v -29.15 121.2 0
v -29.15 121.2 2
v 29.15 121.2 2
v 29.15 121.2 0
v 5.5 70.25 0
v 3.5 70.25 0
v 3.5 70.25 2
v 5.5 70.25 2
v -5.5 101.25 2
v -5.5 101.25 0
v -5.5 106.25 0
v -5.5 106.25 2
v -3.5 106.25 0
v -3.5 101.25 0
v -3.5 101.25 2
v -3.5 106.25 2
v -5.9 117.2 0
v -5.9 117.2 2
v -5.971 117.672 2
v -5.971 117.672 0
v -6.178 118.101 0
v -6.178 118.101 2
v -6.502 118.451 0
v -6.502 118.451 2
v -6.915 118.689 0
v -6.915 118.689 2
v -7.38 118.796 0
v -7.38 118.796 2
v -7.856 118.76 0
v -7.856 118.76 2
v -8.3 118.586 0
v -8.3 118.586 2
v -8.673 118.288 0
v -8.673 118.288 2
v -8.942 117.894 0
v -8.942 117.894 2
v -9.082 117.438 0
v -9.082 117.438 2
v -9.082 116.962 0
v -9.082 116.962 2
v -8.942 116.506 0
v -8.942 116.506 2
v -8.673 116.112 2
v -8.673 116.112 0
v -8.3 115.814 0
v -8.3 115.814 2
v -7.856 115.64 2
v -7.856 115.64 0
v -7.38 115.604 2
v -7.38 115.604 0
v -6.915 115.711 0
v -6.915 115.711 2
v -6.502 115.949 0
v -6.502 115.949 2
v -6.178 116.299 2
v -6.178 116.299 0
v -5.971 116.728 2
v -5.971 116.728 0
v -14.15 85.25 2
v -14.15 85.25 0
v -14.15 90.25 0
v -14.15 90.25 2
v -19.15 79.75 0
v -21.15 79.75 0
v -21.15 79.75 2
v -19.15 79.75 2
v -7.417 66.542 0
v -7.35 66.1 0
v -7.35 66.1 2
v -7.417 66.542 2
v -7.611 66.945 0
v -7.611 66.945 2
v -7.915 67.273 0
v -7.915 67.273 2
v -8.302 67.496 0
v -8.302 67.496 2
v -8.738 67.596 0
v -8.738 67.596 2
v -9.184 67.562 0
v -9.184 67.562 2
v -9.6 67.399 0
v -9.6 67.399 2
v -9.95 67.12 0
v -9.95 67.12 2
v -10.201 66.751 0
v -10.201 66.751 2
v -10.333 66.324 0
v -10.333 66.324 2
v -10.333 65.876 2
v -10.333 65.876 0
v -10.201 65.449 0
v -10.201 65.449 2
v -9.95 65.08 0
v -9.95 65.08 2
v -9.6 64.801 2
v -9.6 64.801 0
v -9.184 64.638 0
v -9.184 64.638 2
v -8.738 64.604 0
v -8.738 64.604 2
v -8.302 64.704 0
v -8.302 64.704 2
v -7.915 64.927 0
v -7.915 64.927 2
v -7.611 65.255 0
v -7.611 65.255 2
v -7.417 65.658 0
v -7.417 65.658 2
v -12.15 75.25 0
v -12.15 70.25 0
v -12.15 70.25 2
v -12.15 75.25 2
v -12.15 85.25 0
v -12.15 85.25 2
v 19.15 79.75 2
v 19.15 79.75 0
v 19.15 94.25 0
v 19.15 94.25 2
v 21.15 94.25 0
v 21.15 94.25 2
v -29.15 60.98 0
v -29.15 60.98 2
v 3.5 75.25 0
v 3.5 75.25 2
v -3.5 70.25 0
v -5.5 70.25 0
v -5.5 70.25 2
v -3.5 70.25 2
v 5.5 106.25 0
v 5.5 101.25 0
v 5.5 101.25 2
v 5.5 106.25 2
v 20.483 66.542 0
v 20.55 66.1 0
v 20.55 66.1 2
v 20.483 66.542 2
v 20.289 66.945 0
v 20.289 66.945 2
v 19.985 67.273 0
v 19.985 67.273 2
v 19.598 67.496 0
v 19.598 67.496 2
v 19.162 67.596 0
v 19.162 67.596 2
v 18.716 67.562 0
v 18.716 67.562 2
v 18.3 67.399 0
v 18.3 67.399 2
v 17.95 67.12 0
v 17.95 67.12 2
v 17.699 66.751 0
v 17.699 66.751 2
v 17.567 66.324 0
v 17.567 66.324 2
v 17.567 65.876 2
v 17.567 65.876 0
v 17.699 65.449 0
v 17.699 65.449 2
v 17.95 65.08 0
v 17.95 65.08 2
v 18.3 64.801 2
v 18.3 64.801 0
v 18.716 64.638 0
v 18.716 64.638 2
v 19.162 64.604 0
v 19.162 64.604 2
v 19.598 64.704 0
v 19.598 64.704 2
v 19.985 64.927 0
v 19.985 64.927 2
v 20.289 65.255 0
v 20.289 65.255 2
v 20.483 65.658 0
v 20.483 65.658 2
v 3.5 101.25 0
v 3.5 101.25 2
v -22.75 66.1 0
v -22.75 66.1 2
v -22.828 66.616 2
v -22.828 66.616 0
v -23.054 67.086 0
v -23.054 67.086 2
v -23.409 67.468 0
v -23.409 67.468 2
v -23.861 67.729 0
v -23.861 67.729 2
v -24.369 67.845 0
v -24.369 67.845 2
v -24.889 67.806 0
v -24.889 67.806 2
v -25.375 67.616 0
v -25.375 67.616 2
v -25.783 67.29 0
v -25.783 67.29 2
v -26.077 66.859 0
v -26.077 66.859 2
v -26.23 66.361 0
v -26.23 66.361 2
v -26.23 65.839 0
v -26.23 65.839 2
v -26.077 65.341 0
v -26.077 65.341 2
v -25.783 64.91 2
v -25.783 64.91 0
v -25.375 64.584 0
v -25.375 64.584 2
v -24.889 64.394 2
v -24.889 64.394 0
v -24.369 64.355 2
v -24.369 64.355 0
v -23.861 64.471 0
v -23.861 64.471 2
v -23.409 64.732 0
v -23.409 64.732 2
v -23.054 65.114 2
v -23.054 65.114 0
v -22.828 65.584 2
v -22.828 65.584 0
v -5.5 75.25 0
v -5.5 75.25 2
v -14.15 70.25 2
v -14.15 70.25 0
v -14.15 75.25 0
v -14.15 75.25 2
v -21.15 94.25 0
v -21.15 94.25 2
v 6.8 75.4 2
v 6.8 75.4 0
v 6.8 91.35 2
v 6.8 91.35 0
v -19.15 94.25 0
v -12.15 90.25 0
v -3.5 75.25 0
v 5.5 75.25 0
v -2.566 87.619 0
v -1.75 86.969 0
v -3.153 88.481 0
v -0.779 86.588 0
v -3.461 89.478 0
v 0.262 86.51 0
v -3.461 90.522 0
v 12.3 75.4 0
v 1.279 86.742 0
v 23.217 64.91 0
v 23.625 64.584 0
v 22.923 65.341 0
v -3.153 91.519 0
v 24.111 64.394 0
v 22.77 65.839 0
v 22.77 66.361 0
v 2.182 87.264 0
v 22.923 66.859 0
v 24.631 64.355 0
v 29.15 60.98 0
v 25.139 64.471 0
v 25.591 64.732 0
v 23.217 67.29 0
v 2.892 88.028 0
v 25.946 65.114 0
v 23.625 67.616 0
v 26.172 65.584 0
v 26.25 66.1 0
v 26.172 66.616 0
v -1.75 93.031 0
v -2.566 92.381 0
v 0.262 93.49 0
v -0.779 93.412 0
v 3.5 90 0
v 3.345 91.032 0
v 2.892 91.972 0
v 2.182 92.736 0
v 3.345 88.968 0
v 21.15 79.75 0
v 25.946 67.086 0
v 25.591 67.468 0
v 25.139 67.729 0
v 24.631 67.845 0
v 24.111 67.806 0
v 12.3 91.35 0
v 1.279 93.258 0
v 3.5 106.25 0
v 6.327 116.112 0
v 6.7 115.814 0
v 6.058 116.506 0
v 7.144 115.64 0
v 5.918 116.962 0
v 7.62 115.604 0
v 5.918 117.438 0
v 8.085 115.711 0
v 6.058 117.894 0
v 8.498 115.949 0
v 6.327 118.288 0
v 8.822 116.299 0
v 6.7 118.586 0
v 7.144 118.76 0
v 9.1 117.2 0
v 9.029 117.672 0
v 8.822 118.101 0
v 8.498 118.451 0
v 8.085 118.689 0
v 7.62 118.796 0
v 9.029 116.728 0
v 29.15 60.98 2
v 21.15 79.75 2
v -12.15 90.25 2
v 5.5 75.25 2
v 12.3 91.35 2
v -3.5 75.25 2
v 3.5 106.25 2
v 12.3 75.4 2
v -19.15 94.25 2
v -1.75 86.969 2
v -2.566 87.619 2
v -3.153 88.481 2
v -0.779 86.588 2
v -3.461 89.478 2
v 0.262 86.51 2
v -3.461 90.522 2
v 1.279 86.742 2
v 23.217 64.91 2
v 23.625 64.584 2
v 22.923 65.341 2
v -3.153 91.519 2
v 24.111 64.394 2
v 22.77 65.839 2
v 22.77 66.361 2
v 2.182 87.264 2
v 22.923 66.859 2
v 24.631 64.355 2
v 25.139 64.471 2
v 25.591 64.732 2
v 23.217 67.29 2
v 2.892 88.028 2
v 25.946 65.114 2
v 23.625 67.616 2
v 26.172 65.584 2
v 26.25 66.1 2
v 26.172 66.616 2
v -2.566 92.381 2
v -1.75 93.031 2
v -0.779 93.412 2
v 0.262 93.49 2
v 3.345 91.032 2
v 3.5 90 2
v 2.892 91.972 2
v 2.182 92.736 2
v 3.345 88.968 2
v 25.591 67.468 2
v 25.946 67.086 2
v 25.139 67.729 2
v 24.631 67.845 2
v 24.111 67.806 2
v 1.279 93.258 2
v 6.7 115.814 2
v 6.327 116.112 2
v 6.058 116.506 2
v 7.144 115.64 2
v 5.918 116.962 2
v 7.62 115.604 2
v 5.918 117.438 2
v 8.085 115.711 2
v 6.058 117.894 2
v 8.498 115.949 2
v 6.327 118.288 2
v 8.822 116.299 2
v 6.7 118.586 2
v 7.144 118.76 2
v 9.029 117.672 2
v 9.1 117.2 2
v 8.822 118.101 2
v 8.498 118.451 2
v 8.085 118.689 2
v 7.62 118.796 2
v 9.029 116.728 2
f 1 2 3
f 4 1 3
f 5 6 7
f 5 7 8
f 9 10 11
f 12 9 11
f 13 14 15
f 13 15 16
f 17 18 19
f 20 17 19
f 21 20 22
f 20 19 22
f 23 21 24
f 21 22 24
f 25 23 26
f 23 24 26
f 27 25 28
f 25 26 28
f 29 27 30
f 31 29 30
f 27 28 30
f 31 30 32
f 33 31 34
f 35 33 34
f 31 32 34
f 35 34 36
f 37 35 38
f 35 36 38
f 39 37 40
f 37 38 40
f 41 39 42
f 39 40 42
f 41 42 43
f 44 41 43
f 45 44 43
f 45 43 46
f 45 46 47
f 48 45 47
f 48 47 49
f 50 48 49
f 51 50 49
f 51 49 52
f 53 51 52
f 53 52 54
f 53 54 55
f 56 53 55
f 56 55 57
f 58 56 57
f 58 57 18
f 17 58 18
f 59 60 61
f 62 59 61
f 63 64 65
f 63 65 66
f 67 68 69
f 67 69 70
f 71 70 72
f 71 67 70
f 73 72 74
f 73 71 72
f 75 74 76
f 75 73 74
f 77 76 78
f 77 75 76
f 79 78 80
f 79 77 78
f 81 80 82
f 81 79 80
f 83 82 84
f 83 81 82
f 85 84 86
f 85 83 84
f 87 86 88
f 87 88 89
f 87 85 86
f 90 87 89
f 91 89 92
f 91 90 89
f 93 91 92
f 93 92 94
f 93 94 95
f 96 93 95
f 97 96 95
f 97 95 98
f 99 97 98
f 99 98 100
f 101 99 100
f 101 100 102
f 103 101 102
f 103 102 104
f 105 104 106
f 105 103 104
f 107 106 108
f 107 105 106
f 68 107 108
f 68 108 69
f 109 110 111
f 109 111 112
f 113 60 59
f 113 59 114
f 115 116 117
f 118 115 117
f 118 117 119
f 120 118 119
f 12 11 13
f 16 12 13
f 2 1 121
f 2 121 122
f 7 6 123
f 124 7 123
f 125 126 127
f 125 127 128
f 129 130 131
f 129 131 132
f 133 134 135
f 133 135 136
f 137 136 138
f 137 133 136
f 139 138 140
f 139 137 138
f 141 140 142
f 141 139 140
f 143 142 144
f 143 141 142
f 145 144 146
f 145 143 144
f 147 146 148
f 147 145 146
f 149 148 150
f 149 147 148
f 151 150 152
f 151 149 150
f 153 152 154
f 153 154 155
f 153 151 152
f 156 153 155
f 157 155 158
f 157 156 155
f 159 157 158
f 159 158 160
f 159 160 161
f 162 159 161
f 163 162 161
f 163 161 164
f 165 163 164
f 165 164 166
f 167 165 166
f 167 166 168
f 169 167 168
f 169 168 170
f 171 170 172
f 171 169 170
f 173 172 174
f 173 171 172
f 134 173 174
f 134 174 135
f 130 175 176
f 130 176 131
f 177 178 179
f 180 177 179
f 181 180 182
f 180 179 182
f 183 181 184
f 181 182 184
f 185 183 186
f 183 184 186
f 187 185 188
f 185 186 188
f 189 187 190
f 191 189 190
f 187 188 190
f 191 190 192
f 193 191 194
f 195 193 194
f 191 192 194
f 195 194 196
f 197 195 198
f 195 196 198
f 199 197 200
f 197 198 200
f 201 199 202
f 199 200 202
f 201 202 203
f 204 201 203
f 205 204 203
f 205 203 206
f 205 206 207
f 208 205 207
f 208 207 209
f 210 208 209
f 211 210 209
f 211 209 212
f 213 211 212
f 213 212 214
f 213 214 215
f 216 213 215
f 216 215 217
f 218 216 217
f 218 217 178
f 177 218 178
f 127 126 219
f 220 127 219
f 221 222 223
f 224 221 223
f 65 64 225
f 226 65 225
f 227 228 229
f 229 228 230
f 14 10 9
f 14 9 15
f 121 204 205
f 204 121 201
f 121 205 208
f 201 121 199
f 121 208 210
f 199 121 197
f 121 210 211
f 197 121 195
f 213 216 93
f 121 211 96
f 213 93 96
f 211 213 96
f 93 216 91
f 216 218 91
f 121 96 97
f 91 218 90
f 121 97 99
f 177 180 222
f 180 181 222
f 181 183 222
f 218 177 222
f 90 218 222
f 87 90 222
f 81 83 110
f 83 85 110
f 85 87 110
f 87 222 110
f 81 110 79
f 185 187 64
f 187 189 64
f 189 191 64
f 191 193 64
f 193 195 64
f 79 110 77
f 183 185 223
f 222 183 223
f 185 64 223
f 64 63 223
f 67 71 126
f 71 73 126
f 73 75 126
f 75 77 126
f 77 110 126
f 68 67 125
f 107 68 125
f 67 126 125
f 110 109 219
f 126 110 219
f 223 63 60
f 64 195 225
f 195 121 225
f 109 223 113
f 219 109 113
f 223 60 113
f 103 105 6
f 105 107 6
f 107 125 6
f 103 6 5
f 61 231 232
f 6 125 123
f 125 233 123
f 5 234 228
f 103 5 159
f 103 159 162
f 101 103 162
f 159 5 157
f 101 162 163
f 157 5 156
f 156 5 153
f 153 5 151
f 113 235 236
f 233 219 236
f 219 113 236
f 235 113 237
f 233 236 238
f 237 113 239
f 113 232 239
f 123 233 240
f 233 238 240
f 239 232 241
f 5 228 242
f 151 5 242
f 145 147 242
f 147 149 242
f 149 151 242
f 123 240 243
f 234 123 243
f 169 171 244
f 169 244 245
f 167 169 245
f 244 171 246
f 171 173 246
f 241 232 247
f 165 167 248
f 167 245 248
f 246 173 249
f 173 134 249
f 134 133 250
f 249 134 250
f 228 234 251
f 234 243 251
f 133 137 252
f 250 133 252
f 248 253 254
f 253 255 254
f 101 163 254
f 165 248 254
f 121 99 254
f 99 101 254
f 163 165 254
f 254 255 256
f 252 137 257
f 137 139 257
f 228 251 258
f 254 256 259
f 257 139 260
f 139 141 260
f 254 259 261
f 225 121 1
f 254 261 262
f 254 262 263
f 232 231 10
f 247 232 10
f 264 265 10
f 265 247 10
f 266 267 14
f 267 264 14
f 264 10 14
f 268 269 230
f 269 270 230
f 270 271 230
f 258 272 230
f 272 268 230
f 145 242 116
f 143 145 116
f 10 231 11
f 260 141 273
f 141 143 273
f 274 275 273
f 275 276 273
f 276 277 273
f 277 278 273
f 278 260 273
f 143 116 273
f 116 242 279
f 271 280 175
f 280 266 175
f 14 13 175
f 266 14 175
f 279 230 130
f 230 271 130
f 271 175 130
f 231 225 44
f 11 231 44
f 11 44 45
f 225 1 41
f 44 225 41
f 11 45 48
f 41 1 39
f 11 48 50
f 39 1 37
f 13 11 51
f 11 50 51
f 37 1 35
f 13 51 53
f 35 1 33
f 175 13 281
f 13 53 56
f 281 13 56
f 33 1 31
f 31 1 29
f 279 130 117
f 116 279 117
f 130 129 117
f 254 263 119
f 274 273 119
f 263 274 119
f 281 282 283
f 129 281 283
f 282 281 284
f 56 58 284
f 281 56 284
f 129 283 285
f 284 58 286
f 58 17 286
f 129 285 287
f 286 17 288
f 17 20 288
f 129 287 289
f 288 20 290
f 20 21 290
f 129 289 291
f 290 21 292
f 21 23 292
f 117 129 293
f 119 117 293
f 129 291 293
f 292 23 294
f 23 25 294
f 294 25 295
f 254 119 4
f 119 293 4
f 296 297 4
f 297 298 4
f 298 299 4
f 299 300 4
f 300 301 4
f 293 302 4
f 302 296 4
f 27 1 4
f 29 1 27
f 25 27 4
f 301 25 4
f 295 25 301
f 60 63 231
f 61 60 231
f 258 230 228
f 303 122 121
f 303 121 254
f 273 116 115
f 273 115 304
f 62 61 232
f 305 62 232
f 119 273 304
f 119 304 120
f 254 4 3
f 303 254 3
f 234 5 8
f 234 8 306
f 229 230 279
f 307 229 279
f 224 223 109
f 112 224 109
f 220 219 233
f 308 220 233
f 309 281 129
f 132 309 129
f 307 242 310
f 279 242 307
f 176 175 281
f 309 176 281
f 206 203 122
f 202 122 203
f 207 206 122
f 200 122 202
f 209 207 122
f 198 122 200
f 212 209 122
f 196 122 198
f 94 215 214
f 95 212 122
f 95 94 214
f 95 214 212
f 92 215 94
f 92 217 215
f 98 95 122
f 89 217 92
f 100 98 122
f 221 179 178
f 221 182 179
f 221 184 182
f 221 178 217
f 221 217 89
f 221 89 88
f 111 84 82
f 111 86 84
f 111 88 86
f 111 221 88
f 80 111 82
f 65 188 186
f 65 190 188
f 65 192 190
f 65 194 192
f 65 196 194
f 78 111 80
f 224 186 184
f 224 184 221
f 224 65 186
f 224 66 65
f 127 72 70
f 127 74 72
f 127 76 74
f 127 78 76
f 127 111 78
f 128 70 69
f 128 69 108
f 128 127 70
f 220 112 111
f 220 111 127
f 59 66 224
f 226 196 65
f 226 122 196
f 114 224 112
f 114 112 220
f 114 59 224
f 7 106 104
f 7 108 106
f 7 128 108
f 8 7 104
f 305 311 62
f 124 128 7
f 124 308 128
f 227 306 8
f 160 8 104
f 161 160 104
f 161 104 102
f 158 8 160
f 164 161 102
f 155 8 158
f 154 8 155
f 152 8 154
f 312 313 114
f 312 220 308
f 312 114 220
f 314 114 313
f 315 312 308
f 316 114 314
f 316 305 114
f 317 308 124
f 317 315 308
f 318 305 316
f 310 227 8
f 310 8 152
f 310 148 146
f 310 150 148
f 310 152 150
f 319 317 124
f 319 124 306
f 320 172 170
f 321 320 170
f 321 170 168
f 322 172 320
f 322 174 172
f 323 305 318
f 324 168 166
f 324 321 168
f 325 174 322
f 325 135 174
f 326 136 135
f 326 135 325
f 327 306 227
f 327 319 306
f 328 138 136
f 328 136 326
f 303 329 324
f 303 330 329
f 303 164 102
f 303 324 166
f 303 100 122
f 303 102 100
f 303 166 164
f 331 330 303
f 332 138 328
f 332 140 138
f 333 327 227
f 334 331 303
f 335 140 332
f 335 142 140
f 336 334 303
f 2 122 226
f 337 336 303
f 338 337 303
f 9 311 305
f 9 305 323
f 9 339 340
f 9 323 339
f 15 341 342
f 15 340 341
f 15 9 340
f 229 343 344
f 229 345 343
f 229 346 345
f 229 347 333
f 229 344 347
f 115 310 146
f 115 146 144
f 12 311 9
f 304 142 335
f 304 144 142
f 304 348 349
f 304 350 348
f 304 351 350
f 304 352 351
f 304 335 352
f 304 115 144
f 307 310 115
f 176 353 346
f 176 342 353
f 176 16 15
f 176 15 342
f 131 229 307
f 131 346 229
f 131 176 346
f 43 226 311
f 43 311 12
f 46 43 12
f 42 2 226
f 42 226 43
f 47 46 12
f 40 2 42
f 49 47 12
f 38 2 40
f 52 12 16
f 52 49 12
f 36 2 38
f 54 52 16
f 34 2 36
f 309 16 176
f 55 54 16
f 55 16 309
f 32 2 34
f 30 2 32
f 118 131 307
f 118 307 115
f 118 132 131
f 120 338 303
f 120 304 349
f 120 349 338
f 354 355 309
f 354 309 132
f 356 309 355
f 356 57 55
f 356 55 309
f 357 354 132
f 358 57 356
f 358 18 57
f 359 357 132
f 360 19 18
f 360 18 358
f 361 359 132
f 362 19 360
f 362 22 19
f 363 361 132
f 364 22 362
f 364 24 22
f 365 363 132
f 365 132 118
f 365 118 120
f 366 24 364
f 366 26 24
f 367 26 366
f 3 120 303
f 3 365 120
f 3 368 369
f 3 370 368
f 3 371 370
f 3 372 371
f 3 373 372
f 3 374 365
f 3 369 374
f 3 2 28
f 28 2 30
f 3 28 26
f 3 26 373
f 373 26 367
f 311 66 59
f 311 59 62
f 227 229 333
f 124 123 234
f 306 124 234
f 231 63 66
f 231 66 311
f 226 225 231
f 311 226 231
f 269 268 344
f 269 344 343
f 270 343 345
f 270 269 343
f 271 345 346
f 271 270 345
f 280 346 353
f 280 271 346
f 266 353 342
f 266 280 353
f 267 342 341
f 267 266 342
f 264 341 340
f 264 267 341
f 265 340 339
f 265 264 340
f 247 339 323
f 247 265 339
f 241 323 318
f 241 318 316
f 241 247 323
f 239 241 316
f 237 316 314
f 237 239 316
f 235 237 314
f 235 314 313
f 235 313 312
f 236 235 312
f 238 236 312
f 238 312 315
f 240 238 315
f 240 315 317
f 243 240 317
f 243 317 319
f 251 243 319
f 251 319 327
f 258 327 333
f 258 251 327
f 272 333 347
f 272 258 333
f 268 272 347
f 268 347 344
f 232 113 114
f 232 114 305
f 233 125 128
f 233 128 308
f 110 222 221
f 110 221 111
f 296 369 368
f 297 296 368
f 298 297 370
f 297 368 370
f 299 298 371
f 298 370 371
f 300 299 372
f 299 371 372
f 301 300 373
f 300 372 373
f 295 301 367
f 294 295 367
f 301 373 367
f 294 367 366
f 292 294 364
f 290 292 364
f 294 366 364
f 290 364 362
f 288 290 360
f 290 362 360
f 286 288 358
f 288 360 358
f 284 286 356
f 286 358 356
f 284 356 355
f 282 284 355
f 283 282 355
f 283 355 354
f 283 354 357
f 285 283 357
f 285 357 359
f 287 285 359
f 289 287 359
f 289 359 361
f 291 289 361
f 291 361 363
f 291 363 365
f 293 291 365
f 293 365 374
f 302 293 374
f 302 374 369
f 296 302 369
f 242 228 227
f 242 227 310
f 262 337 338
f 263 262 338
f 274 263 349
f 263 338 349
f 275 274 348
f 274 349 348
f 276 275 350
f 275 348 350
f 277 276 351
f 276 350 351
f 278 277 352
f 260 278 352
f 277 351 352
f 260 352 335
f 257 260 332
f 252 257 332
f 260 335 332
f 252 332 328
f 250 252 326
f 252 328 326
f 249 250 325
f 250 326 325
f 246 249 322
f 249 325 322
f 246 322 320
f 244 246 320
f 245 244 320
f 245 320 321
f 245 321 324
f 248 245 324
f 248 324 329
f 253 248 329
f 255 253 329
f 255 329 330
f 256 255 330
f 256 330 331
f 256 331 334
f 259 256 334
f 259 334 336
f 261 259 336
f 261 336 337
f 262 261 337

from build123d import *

# Parameters (mm, degrees)
SKETCH1_R           = 3.5
SKETCH1_R_2         = 1.5
SKETCH1_R_3         = 2.5
SKETCH1_W           = 2
SKETCH1_H           = 5
SKETCH1_W_2         = 5.5
SKETCH1_H_2         = 15.95
SKETCH1_H_3         = 14.5
BOSS_EXTRUDE1_DEPTH = 2
SKETCH_5_W          = 53.3
SKETCH_5_H          = 62.979589089
CUT_EXTRUDE_1_DEPTH = 10
SKETCH_6_R          = 1.75
CUT_EXTRUDE_2_DEPTH = 10
SKETCH_7_W          = 2
SKETCH_7_H          = 65.797700214
EXTRUDE_1_DEPTH     = 2.5
SKETCH_8_W          = 2
SKETCH_8_H          = 65.797700214
EXTRUDE_2_DEPTH     = 2.5
SKETCH_9_W          = 58.3
SKETCH_9_H          = 2
EXTRUDE_3_DEPTH     = 2
SKETCH_10_W         = 58.3
SKETCH_10_H         = 5
CUT_EXTRUDE_3_DEPTH = 10
SKETCH_13_W         = 58.3
SKETCH_13_H         = 2.577289
CUT_EXTRUDE_4_DEPTH = 10
SKETCH_14_R         = 1.6
CUT_EXTRUDE_5_DEPTH = 10


with BuildPart() as part:
    # Sketch1 → Boss-Extrude1 (new body)
    with BuildSketch(Plane.XY):
        with BuildLine():
            Line((-25.65, 0), (25.65, 0))
            ThreePointArc((25.65, 0), (26.357106781, 0.292893219), (26.65, 1))
            Line((26.65, 1), (26.65, 123.726079281))
            Line((26.65, 123.726079281), (26.65, 128.777289303))
            Line((26.65, 128.777289303), (-26.65, 128.777289303))
            Line((-26.65, 128.777289303), (-26.65, 99.754415082))
            Line((-26.65, 99.754415082), (-26.65, 1))
            ThreePointArc((-26.65, 1), (-26.357106781, 0.292893219), (-25.65, 0))
        make_face()
        with Locations((0, 90)):
            Circle(SKETCH1_R, mode=Mode.SUBTRACT)
        with Locations((19.05, 66.1)):
            Circle(SKETCH1_R_2, mode=Mode.SUBTRACT)
        with Locations((-8.85, 66.1)):
            Circle(SKETCH1_R_2, mode=Mode.SUBTRACT)
        with Locations((-24.05, 15.3)):
            Circle(SKETCH1_R_2, mode=Mode.SUBTRACT)
        with Locations((24.15, 14)):
            Circle(SKETCH1_R_2, mode=Mode.SUBTRACT)
        with Locations((0, 34.3)):
            Circle(SKETCH1_R_3, mode=Mode.SUBTRACT)
        with Locations((4.5, 103.75)):
            Rectangle(SKETCH1_W, SKETCH1_H, mode=Mode.SUBTRACT)
        with Locations((9.55, 83.375)):
            Rectangle(SKETCH1_W_2, SKETCH1_H_2, mode=Mode.SUBTRACT)
        with Locations((20.15, 87)):
            Rectangle(SKETCH1_W, SKETCH1_H_3, mode=Mode.SUBTRACT)
        with Locations((4.5, 72.75)):
            Rectangle(SKETCH1_W, SKETCH1_H, mode=Mode.SUBTRACT)
        with Locations((-4.5, 72.75)):
            Rectangle(SKETCH1_W, SKETCH1_H, mode=Mode.SUBTRACT)
        with Locations((-20.15, 87)):
            Rectangle(SKETCH1_W, SKETCH1_H_3, mode=Mode.SUBTRACT)
        with Locations((-4.5, 103.75)):
            Rectangle(SKETCH1_W, SKETCH1_H, mode=Mode.SUBTRACT)
        with Locations((-13.15, 72.75)):
            Rectangle(SKETCH1_W, SKETCH1_H, mode=Mode.SUBTRACT)
        with Locations((-13.15, 87.75)):
            Rectangle(SKETCH1_W, SKETCH1_H, mode=Mode.SUBTRACT)
        Polygon((-20, 34.3), (-20, 36.05), (-7, 36.05), (-7, 34.3), (-7, 32.55), (-20, 32.55), align=None, mode=Mode.SUBTRACT)
        Polygon((-5.232050808, 39.362177826), (-15.732050808, 57.548711306), (-12.267949192, 59.548711306), (-1.767949192, 41.362177826), align=None, mode=Mode.SUBTRACT)
        Polygon((1.767949192, 41.362177826), (5.232050808, 39.362177826), (15.732050808, 57.548711306), (12.267949192, 59.548711306), align=None, mode=Mode.SUBTRACT)
        Polygon((7, 34.3), (7, 32.55), (20, 32.55), (20, 34.3), (20, 36.05), (7, 36.05), align=None, mode=Mode.SUBTRACT)
        Polygon((-1.767949192, 27.237822174), (-5.232050808, 29.237822174), (-15.732050808, 11.051288694), (-12.267949192, 9.051288694), align=None, mode=Mode.SUBTRACT)
        Polygon((15.732050808, 11.051288694), (12.267949192, 9.051288694), (1.767949192, 27.237822174), (5.232050808, 29.237822174), align=None, mode=Mode.SUBTRACT)
    extrude(amount=BOSS_EXTRUDE1_DEPTH)

    # 草图5 → 切除-拉伸1 (cut)
    with BuildSketch(Plane(origin=(0, 0, 0), x_dir=(-1, 0, 0), z_dir=(0, 0, -1))):
        with Locations((0, 31.489794545)):
            Rectangle(SKETCH_5_W, SKETCH_5_H)
    extrude(amount=-CUT_EXTRUDE_1_DEPTH, mode=Mode.SUBTRACT)

    # 草图6 → 切除-拉伸2 (cut)
    with BuildSketch(Plane.XY.offset(2)):
        with Locations((-24.5, 66.1)):
            Circle(SKETCH_6_R)
        with Locations((24.5, 66.1)):
            Circle(SKETCH_6_R)
    extrude(amount=-CUT_EXTRUDE_2_DEPTH, mode=Mode.SUBTRACT)

    # 草图7 → 凸台-拉伸1 (add)
    with BuildSketch(Plane(origin=(26.65, 0, 0), x_dir=(0, 0, -1), z_dir=(1, 0, 0))):
        with Locations((-1, 95.878439196)):
            Rectangle(SKETCH_7_W, SKETCH_7_H)
    extrude(amount=EXTRUDE_1_DEPTH)

    # 草图8 → 凸台-拉伸2 (add)
    with BuildSketch(Plane.ZY.offset(26.65)):
        with Locations((1, 95.878439196)):
            Rectangle(SKETCH_8_W, SKETCH_8_H)
    extrude(amount=EXTRUDE_2_DEPTH)

    # 草图9 → 凸台-拉伸3 (add)
    with BuildSketch(Plane.XZ.offset(-62.979589089)):
        with Locations((0, 1)):
            Rectangle(SKETCH_9_W, SKETCH_9_H)
    extrude(amount=EXTRUDE_3_DEPTH)

    # 草图10 → 切除-拉伸3 (cut)
    with BuildSketch(Plane.XY.offset(2)):
        with Locations((0, 126.277289303)):
            Rectangle(SKETCH_10_W, SKETCH_10_H)
    extrude(amount=-CUT_EXTRUDE_3_DEPTH, mode=Mode.SUBTRACT)

    # 草图13 → 切除-拉伸4 (cut)
    with BuildSketch(Plane.XY.offset(2)):
        with Locations((0, 122.488644803)):
            Rectangle(SKETCH_13_W, SKETCH_13_H)
    extrude(amount=-CUT_EXTRUDE_4_DEPTH, mode=Mode.SUBTRACT)

    # 草图14 → 切除-拉伸5 (cut)
    with BuildSketch(Plane.XY.offset(2)):
        with Locations((-7.5, 117.200000303)):
            Circle(SKETCH_14_R)
        with Locations((7.5, 117.200000303)):
            Circle(SKETCH_14_R)
    extrude(amount=-CUT_EXTRUDE_5_DEPTH, mode=Mode.SUBTRACT)


solid = part.part
